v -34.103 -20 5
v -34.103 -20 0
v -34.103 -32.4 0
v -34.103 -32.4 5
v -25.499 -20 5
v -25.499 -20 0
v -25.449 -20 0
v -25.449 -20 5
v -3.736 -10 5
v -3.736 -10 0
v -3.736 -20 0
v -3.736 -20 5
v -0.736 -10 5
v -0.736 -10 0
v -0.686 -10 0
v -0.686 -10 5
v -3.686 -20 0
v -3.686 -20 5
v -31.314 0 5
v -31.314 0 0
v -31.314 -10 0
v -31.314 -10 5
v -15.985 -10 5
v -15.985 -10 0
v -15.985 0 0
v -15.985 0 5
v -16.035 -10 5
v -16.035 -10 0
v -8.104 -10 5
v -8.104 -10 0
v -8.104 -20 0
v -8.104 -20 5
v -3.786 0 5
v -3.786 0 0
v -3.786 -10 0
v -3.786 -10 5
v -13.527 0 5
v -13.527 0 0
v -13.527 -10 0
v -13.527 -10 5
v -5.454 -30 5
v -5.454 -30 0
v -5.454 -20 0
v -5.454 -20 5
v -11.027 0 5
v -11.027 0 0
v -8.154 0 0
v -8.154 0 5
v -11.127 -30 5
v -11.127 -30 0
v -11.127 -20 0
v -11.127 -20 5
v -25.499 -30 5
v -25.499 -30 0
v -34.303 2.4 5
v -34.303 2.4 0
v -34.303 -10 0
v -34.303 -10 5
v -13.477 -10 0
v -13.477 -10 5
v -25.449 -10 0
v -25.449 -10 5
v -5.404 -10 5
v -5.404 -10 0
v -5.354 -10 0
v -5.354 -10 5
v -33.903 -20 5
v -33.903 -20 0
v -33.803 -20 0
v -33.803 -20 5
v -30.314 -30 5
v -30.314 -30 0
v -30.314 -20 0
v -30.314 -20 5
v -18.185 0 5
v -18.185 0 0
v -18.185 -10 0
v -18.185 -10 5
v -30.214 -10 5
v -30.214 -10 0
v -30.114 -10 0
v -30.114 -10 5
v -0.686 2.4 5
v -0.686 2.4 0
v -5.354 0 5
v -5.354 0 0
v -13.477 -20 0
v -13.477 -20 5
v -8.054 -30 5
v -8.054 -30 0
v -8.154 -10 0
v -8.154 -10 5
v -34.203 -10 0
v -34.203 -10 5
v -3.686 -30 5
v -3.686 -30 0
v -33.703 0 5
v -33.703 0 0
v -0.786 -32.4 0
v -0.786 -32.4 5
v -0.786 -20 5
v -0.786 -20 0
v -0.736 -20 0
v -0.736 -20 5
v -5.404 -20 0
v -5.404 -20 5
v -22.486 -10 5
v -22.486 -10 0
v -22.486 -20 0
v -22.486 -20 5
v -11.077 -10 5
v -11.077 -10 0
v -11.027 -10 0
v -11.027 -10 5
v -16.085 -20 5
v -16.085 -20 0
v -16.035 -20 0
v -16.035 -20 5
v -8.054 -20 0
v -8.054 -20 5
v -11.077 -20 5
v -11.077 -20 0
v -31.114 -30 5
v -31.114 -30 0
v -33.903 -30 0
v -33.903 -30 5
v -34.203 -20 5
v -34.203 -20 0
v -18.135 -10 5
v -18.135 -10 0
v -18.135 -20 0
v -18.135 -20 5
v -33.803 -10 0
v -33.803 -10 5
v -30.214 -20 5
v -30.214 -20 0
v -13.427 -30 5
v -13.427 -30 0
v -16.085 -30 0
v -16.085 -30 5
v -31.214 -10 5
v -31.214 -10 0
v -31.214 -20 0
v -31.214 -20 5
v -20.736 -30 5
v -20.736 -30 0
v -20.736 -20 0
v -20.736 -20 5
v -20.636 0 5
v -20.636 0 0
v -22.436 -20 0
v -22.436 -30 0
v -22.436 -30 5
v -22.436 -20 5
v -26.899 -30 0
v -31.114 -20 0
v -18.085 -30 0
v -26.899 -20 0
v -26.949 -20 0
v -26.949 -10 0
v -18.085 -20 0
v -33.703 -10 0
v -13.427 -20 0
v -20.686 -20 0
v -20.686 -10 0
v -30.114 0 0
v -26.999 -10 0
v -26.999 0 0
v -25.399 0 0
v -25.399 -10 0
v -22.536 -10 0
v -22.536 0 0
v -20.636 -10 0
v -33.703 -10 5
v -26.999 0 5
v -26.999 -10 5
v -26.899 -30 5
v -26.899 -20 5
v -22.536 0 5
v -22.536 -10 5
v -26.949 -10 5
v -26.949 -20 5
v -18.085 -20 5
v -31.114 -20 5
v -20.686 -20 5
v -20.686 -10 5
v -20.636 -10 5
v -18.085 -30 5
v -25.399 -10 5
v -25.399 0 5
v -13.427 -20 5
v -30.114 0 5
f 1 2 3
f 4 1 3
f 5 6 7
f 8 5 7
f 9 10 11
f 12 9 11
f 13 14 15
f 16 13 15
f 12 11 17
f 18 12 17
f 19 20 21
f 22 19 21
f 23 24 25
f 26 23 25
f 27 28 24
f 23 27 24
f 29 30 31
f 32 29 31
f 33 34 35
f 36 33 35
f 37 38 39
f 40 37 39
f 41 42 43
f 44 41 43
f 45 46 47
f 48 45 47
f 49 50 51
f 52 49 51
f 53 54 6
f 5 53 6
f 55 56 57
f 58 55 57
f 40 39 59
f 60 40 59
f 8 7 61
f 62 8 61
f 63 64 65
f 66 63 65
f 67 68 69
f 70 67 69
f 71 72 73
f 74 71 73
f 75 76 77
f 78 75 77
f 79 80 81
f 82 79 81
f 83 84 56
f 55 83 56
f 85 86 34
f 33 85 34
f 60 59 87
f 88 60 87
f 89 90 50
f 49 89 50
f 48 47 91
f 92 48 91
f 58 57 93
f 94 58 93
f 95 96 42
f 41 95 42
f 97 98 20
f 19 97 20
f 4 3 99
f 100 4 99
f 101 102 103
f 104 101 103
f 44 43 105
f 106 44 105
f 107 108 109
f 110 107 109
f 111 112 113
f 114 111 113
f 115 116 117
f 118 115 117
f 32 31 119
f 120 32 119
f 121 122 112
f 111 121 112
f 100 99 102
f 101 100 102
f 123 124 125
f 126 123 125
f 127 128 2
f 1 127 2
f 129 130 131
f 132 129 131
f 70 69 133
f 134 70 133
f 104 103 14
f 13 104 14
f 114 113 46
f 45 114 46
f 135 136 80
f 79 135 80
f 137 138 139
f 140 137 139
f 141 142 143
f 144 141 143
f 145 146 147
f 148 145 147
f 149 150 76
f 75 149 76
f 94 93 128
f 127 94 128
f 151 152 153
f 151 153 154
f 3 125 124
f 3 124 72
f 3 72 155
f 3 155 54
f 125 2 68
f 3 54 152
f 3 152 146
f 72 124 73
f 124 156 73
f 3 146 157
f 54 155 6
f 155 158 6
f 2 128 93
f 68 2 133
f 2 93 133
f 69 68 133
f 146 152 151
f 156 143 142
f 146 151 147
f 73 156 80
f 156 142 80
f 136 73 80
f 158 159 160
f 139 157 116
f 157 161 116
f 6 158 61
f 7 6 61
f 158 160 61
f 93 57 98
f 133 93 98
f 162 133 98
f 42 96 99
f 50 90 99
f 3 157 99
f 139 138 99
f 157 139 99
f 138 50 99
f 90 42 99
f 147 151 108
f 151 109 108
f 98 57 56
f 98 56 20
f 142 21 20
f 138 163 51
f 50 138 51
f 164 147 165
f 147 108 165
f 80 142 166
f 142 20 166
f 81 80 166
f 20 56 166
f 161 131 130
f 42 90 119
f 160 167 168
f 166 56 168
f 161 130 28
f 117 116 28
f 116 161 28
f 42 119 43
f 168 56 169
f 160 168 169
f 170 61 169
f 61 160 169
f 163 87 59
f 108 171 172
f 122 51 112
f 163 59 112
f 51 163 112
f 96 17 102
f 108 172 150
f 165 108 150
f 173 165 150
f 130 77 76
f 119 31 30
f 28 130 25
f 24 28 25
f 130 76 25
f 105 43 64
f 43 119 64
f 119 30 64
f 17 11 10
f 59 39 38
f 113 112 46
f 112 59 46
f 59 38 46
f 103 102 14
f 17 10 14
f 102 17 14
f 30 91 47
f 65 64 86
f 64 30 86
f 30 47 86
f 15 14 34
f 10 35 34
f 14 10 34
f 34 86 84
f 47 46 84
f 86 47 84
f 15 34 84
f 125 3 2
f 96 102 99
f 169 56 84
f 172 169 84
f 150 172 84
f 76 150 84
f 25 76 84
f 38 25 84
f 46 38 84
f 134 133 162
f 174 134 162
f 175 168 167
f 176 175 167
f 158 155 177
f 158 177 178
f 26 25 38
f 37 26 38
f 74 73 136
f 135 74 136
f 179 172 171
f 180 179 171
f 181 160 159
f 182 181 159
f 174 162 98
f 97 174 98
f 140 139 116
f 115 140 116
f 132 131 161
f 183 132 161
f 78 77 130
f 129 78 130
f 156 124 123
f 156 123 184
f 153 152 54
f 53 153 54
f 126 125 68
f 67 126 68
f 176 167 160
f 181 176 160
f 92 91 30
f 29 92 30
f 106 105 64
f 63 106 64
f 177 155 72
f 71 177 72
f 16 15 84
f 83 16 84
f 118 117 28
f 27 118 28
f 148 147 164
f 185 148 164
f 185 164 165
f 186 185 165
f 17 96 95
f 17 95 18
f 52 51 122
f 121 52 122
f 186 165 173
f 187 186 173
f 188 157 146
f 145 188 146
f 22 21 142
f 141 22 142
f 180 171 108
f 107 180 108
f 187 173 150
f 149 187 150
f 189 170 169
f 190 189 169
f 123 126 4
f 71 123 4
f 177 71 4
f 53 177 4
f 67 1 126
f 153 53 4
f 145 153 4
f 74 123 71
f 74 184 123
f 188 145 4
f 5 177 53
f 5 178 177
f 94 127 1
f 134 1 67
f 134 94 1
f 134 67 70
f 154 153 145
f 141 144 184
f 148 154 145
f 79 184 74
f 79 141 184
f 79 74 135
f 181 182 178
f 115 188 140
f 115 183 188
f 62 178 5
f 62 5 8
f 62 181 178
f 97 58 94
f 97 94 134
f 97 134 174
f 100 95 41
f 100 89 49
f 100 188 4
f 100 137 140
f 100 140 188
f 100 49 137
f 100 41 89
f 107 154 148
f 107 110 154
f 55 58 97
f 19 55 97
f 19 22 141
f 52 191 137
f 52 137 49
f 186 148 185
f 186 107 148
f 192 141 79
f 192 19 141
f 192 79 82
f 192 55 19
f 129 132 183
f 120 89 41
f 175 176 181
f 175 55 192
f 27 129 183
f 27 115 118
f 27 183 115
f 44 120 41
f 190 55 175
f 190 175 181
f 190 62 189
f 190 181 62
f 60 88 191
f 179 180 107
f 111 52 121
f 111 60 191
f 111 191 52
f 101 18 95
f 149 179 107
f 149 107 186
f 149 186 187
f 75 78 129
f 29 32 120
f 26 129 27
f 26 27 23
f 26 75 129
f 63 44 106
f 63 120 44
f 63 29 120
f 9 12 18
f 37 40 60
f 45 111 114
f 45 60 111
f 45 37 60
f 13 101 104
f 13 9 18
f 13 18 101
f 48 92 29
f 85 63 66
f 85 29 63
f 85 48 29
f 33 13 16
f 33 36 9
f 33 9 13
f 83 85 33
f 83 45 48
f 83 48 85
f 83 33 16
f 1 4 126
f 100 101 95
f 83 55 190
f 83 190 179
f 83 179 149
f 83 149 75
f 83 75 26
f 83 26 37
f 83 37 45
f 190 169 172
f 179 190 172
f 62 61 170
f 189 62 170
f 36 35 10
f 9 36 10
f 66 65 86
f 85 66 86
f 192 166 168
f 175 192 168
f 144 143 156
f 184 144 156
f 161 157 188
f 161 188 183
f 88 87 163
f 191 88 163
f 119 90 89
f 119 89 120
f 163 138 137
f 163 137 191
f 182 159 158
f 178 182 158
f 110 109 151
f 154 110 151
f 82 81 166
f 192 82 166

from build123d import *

# Parameters (mm, degrees)
F0_W     = 0.2
F0_H     = 10
F0_W_2   = 2.9
F0_W_3   = 2.6
F0_W_4   = 2.3
F0_W_5   = 2
F0_W_6   = 1.7
F0_W_7   = 1.4
F0_W_8   = 0.8
F1_DEPTH = 5


with BuildPart() as f1:
    # F0 (on Top) → F1 (new body)
    with BuildSketch(Plane.XY):
        with Locations((-34.0027, -25)):
            Rectangle(F0_W, F0_H)
        Polygon((-33.9027, -30), (-34.1027, -30), (-34.1027, -32.4), (-0.786174, -32.4), (-0.786174, -30), (-3.686174, -30), (-5.454433, -30), (-8.054433, -30), (-11.126836, -30), (-13.426836, -30), (-16.084759, -30), (-18.084759, -30), (-20.736083, -30), (-22.436083, -30), (-25.499359, -30), (-26.899359, -30), (-30.313995, -30), (-31.113995, -30), align=None)
        Polygon((-34.2027, -20), (-34.1027, -20), (-33.9027, -20), (-33.8027, -20), (-33.8027, -10), (-34.2027, -10), align=None)
        Polygon((-34.3027, -10), (-34.2027, -10), (-33.8027, -10), (-33.7027, -10), (-33.7027, 0), (-34.3027, 0), align=None)
        with Locations((-2.236174, -25)):
            Rectangle(F0_W_2, F0_H)
        Polygon((-3.686174, -20), (-0.786174, -20), (-0.736174, -20), (-0.736174, -10), (-3.736174, -10), (-3.736174, -20), align=None)
        Polygon((-34.3027, 2.4), (-34.3027, 0), (-33.7027, 0), (-31.313995, 0), (-30.113995, 0), (-26.999359, 0), (-25.399359, 0), (-22.536083, 0), (-20.636083, 0), (-18.184759, 0), (-15.984759, 0), (-13.526836, 0), (-11.026836, 0), (-8.154433, 0), (-5.354433, 0), (-3.786174, 0), (-0.686174, 0), (-0.686174, 2.4), align=None)
        Polygon((-3.736174, -10), (-0.736174, -10), (-0.686174, -10), (-0.686174, 0), (-3.786174, 0), (-3.786174, -10), align=None)
        Polygon((-31.313995, -10), (-31.213995, -10), (-30.213995, -10), (-30.113995, -10), (-30.113995, 0), (-31.313995, 0), align=None)
        Polygon((-26.999359, -10), (-26.949359, -10), (-25.449359, -10), (-25.399359, -10), (-25.399359, 0), (-26.999359, 0), align=None)
        Polygon((-22.536083, -10), (-22.486083, -10), (-20.686083, -10), (-20.636083, -10), (-20.636083, 0), (-22.536083, 0), align=None)
        Polygon((-18.184759, -10), (-18.134759, -10), (-16.034759, -10), (-15.984759, -10), (-15.984759, 0), (-18.184759, 0), align=None)
        Polygon((-13.476836, -10), (-11.076836, -10), (-11.026836, -10), (-11.026836, 0), (-13.526836, 0), (-13.526836, -10), align=None)
        Polygon((-8.104433, -10), (-5.404433, -10), (-5.354433, -10), (-5.354433, 0), (-8.154433, 0), (-8.154433, -10), align=None)
        with Locations((-6.754433, -25)):
            Rectangle(F0_W_3, F0_H)
        with Locations((-12.276836, -25)):
            Rectangle(F0_W_4, F0_H)
        Polygon((-13.426836, -20), (-11.126836, -20), (-11.076836, -20), (-11.076836, -10), (-13.476836, -10), (-13.476836, -20), align=None)
        Polygon((-18.134759, -20), (-18.084759, -20), (-16.084759, -20), (-16.034759, -20), (-16.034759, -10), (-18.134759, -10), align=None)
        with Locations((-17.084759, -25)):
            Rectangle(F0_W_5, F0_H)
        with Locations((-21.586083, -25)):
            Rectangle(F0_W_6, F0_H)
        Polygon((-22.486083, -20), (-22.436083, -20), (-20.736083, -20), (-20.686083, -20), (-20.686083, -10), (-22.486083, -10), align=None)
        Polygon((-26.949359, -20), (-26.899359, -20), (-25.499359, -20), (-25.449359, -20), (-25.449359, -10), (-26.949359, -10), align=None)
        with Locations((-26.199359, -25)):
            Rectangle(F0_W_7, F0_H)
        Polygon((-31.213995, -20), (-31.113995, -20), (-30.313995, -20), (-30.213995, -20), (-30.213995, -10), (-31.213995, -10), align=None)
        with Locations((-30.713995, -25)):
            Rectangle(F0_W_8, F0_H)
        Polygon((-8.054433, -20), (-5.454433, -20), (-5.404433, -20), (-5.404433, -10), (-8.104433, -10), (-8.104433, -20), align=None)
    extrude(amount=F1_DEPTH)


solid = f1.part
